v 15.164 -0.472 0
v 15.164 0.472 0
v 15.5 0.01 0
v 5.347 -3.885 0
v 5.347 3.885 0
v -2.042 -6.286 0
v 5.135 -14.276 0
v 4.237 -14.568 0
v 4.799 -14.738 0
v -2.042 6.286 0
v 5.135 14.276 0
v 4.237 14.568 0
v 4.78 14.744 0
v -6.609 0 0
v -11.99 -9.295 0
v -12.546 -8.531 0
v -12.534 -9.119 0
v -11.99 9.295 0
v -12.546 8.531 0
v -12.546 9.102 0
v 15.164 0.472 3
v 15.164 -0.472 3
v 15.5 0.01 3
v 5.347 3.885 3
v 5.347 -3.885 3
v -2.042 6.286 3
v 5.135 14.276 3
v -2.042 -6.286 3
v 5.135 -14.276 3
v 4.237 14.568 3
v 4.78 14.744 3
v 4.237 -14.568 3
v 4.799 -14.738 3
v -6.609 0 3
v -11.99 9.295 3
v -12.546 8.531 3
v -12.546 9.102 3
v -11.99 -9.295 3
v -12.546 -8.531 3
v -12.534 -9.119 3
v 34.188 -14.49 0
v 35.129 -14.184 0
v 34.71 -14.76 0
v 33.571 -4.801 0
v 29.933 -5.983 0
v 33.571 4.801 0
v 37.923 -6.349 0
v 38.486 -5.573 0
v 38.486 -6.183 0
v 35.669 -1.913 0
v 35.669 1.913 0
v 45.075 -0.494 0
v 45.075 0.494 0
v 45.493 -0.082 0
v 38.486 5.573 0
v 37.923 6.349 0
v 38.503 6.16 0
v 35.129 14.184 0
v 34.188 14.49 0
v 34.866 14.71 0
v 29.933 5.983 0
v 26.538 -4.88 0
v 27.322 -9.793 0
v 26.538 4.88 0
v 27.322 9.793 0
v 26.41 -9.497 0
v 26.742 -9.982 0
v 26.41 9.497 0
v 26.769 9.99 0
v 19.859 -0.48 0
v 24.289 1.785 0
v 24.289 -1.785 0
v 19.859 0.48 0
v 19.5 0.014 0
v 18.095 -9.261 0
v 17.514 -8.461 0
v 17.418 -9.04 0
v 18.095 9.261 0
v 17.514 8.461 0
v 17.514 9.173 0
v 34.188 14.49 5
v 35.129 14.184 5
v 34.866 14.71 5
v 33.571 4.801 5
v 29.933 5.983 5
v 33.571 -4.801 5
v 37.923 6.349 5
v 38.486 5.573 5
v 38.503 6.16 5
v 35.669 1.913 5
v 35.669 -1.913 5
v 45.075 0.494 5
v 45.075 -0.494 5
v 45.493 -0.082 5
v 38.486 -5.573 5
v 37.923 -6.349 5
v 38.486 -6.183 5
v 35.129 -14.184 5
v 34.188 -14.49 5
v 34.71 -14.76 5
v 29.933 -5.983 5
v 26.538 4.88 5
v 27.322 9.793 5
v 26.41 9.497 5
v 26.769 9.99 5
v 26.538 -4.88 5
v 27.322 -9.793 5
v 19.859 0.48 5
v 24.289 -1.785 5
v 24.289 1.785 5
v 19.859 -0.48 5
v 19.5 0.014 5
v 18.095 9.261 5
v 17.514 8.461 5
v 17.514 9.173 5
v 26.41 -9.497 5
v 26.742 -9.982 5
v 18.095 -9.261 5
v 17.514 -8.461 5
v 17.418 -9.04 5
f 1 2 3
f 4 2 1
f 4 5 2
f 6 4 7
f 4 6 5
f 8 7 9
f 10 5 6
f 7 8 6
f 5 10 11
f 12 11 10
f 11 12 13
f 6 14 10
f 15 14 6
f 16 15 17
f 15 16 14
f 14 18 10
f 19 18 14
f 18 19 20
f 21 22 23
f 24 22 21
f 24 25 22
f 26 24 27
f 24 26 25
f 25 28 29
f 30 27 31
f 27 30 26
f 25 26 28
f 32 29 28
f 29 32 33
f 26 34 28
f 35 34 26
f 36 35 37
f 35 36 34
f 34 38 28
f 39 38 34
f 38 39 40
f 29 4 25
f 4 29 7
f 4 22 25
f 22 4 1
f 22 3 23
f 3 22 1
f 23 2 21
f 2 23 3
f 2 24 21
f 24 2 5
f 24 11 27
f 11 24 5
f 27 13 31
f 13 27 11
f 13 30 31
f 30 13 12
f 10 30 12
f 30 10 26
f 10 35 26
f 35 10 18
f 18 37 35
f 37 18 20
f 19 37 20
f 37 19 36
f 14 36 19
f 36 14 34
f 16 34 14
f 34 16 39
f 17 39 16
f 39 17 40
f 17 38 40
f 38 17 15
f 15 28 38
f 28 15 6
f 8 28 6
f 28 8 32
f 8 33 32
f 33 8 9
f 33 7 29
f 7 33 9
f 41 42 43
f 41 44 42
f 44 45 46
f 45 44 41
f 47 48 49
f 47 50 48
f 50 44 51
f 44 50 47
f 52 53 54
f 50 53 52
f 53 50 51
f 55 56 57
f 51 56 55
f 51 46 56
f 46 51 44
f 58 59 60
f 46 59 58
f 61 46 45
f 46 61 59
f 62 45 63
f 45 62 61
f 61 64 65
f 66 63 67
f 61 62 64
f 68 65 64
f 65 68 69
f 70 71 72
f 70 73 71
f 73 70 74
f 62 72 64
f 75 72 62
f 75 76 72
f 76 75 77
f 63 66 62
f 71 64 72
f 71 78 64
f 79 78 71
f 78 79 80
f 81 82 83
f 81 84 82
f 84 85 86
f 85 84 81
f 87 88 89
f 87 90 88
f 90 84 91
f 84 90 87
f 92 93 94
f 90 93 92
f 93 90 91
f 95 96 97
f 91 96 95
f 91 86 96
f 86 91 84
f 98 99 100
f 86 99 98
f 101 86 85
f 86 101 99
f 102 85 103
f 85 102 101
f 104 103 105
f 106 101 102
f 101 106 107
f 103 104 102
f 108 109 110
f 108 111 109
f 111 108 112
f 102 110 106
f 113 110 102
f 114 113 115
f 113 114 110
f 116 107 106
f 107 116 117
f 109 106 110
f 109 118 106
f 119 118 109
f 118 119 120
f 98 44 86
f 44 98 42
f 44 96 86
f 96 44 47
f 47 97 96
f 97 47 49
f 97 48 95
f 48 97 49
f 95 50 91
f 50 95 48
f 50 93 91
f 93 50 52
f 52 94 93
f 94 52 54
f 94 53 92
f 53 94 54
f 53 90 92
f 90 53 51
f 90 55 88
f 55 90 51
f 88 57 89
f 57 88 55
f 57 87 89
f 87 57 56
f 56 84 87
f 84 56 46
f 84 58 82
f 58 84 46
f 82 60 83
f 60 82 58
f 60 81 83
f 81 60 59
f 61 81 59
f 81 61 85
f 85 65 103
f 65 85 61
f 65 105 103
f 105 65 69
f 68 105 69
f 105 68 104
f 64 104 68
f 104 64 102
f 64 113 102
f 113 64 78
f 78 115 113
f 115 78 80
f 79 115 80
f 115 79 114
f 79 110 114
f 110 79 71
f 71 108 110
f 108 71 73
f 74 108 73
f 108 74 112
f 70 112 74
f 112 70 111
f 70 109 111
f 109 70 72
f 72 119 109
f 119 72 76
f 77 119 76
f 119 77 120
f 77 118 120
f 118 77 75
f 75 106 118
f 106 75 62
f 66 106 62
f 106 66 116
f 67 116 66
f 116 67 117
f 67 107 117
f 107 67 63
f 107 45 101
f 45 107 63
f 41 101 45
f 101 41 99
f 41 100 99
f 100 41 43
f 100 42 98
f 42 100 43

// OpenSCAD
// # SYNOPSIS
// Yields a customizeable star 2D polygon.
//
// # PARAMETERS
//
// n       :: This is the number of spikes you want your star to have. 
//            Please note that a spike is a spike regardless of its height.
//            Please also note that two consecutive ends of a segment are
//            assumed to either be the 'top' and 'low' of one spike.
//
// heights :: A vector consisting of the heights pattern.
//
// # EXAMPLES
//
// ## Basic example
// Here is a basic example that draws the typical 5 spiked "US star"
// ```
// linear_extrude(3) star(5, [15, 6]);
// ```
//
// ## More complete example
// Assuming you'd want to draw a pretty star with alternating long and short 
// spikes, you would want to use this module as follows:
// ```
// linear_extrude(5)           // Star is nothing but the polygon, give it 
//                             // some thickness by extruding it.
//   offset(r=.5)              // If you want rounded corners
//   star(10, [15, 5, 10, 5]); // Yields the 2D star polygon
// ```
// 
// # CREDITS
//
// This design was inspired by @annoved's star module 
// (https://gist.github.com/anoved/9622826) but I altered it so as to deal
// with "irregular" stars having 'spikes' of various heights.
//
module star(n, heights) {
    angle             = 360 / (2*n); // The angle between any two points
    function x(r, a)  = r * cos(a);  // x-member of a 2d coordinate
    function y(r, a)  = r * sin(a);  // y-member of a 2d coordinate
    function h(i)     = heights[i % len(heights)]; // height of the ith vertex
    function point(i) = [ x(h(i), i * angle), y(h(i), i * angle) ];
    
    coordinates = [ for(i = [0:(2*n)-1]) point(i) ];
    polygon(points=coordinates);
}


// Basic example
linear_extrude(3) offset(r=.5) star(5, [15, 6]);

// Advanced example
translate([30, 0, 0])
linear_extrude(5) offset(r=.5) star(10, [15, 5, 10, 5]);
